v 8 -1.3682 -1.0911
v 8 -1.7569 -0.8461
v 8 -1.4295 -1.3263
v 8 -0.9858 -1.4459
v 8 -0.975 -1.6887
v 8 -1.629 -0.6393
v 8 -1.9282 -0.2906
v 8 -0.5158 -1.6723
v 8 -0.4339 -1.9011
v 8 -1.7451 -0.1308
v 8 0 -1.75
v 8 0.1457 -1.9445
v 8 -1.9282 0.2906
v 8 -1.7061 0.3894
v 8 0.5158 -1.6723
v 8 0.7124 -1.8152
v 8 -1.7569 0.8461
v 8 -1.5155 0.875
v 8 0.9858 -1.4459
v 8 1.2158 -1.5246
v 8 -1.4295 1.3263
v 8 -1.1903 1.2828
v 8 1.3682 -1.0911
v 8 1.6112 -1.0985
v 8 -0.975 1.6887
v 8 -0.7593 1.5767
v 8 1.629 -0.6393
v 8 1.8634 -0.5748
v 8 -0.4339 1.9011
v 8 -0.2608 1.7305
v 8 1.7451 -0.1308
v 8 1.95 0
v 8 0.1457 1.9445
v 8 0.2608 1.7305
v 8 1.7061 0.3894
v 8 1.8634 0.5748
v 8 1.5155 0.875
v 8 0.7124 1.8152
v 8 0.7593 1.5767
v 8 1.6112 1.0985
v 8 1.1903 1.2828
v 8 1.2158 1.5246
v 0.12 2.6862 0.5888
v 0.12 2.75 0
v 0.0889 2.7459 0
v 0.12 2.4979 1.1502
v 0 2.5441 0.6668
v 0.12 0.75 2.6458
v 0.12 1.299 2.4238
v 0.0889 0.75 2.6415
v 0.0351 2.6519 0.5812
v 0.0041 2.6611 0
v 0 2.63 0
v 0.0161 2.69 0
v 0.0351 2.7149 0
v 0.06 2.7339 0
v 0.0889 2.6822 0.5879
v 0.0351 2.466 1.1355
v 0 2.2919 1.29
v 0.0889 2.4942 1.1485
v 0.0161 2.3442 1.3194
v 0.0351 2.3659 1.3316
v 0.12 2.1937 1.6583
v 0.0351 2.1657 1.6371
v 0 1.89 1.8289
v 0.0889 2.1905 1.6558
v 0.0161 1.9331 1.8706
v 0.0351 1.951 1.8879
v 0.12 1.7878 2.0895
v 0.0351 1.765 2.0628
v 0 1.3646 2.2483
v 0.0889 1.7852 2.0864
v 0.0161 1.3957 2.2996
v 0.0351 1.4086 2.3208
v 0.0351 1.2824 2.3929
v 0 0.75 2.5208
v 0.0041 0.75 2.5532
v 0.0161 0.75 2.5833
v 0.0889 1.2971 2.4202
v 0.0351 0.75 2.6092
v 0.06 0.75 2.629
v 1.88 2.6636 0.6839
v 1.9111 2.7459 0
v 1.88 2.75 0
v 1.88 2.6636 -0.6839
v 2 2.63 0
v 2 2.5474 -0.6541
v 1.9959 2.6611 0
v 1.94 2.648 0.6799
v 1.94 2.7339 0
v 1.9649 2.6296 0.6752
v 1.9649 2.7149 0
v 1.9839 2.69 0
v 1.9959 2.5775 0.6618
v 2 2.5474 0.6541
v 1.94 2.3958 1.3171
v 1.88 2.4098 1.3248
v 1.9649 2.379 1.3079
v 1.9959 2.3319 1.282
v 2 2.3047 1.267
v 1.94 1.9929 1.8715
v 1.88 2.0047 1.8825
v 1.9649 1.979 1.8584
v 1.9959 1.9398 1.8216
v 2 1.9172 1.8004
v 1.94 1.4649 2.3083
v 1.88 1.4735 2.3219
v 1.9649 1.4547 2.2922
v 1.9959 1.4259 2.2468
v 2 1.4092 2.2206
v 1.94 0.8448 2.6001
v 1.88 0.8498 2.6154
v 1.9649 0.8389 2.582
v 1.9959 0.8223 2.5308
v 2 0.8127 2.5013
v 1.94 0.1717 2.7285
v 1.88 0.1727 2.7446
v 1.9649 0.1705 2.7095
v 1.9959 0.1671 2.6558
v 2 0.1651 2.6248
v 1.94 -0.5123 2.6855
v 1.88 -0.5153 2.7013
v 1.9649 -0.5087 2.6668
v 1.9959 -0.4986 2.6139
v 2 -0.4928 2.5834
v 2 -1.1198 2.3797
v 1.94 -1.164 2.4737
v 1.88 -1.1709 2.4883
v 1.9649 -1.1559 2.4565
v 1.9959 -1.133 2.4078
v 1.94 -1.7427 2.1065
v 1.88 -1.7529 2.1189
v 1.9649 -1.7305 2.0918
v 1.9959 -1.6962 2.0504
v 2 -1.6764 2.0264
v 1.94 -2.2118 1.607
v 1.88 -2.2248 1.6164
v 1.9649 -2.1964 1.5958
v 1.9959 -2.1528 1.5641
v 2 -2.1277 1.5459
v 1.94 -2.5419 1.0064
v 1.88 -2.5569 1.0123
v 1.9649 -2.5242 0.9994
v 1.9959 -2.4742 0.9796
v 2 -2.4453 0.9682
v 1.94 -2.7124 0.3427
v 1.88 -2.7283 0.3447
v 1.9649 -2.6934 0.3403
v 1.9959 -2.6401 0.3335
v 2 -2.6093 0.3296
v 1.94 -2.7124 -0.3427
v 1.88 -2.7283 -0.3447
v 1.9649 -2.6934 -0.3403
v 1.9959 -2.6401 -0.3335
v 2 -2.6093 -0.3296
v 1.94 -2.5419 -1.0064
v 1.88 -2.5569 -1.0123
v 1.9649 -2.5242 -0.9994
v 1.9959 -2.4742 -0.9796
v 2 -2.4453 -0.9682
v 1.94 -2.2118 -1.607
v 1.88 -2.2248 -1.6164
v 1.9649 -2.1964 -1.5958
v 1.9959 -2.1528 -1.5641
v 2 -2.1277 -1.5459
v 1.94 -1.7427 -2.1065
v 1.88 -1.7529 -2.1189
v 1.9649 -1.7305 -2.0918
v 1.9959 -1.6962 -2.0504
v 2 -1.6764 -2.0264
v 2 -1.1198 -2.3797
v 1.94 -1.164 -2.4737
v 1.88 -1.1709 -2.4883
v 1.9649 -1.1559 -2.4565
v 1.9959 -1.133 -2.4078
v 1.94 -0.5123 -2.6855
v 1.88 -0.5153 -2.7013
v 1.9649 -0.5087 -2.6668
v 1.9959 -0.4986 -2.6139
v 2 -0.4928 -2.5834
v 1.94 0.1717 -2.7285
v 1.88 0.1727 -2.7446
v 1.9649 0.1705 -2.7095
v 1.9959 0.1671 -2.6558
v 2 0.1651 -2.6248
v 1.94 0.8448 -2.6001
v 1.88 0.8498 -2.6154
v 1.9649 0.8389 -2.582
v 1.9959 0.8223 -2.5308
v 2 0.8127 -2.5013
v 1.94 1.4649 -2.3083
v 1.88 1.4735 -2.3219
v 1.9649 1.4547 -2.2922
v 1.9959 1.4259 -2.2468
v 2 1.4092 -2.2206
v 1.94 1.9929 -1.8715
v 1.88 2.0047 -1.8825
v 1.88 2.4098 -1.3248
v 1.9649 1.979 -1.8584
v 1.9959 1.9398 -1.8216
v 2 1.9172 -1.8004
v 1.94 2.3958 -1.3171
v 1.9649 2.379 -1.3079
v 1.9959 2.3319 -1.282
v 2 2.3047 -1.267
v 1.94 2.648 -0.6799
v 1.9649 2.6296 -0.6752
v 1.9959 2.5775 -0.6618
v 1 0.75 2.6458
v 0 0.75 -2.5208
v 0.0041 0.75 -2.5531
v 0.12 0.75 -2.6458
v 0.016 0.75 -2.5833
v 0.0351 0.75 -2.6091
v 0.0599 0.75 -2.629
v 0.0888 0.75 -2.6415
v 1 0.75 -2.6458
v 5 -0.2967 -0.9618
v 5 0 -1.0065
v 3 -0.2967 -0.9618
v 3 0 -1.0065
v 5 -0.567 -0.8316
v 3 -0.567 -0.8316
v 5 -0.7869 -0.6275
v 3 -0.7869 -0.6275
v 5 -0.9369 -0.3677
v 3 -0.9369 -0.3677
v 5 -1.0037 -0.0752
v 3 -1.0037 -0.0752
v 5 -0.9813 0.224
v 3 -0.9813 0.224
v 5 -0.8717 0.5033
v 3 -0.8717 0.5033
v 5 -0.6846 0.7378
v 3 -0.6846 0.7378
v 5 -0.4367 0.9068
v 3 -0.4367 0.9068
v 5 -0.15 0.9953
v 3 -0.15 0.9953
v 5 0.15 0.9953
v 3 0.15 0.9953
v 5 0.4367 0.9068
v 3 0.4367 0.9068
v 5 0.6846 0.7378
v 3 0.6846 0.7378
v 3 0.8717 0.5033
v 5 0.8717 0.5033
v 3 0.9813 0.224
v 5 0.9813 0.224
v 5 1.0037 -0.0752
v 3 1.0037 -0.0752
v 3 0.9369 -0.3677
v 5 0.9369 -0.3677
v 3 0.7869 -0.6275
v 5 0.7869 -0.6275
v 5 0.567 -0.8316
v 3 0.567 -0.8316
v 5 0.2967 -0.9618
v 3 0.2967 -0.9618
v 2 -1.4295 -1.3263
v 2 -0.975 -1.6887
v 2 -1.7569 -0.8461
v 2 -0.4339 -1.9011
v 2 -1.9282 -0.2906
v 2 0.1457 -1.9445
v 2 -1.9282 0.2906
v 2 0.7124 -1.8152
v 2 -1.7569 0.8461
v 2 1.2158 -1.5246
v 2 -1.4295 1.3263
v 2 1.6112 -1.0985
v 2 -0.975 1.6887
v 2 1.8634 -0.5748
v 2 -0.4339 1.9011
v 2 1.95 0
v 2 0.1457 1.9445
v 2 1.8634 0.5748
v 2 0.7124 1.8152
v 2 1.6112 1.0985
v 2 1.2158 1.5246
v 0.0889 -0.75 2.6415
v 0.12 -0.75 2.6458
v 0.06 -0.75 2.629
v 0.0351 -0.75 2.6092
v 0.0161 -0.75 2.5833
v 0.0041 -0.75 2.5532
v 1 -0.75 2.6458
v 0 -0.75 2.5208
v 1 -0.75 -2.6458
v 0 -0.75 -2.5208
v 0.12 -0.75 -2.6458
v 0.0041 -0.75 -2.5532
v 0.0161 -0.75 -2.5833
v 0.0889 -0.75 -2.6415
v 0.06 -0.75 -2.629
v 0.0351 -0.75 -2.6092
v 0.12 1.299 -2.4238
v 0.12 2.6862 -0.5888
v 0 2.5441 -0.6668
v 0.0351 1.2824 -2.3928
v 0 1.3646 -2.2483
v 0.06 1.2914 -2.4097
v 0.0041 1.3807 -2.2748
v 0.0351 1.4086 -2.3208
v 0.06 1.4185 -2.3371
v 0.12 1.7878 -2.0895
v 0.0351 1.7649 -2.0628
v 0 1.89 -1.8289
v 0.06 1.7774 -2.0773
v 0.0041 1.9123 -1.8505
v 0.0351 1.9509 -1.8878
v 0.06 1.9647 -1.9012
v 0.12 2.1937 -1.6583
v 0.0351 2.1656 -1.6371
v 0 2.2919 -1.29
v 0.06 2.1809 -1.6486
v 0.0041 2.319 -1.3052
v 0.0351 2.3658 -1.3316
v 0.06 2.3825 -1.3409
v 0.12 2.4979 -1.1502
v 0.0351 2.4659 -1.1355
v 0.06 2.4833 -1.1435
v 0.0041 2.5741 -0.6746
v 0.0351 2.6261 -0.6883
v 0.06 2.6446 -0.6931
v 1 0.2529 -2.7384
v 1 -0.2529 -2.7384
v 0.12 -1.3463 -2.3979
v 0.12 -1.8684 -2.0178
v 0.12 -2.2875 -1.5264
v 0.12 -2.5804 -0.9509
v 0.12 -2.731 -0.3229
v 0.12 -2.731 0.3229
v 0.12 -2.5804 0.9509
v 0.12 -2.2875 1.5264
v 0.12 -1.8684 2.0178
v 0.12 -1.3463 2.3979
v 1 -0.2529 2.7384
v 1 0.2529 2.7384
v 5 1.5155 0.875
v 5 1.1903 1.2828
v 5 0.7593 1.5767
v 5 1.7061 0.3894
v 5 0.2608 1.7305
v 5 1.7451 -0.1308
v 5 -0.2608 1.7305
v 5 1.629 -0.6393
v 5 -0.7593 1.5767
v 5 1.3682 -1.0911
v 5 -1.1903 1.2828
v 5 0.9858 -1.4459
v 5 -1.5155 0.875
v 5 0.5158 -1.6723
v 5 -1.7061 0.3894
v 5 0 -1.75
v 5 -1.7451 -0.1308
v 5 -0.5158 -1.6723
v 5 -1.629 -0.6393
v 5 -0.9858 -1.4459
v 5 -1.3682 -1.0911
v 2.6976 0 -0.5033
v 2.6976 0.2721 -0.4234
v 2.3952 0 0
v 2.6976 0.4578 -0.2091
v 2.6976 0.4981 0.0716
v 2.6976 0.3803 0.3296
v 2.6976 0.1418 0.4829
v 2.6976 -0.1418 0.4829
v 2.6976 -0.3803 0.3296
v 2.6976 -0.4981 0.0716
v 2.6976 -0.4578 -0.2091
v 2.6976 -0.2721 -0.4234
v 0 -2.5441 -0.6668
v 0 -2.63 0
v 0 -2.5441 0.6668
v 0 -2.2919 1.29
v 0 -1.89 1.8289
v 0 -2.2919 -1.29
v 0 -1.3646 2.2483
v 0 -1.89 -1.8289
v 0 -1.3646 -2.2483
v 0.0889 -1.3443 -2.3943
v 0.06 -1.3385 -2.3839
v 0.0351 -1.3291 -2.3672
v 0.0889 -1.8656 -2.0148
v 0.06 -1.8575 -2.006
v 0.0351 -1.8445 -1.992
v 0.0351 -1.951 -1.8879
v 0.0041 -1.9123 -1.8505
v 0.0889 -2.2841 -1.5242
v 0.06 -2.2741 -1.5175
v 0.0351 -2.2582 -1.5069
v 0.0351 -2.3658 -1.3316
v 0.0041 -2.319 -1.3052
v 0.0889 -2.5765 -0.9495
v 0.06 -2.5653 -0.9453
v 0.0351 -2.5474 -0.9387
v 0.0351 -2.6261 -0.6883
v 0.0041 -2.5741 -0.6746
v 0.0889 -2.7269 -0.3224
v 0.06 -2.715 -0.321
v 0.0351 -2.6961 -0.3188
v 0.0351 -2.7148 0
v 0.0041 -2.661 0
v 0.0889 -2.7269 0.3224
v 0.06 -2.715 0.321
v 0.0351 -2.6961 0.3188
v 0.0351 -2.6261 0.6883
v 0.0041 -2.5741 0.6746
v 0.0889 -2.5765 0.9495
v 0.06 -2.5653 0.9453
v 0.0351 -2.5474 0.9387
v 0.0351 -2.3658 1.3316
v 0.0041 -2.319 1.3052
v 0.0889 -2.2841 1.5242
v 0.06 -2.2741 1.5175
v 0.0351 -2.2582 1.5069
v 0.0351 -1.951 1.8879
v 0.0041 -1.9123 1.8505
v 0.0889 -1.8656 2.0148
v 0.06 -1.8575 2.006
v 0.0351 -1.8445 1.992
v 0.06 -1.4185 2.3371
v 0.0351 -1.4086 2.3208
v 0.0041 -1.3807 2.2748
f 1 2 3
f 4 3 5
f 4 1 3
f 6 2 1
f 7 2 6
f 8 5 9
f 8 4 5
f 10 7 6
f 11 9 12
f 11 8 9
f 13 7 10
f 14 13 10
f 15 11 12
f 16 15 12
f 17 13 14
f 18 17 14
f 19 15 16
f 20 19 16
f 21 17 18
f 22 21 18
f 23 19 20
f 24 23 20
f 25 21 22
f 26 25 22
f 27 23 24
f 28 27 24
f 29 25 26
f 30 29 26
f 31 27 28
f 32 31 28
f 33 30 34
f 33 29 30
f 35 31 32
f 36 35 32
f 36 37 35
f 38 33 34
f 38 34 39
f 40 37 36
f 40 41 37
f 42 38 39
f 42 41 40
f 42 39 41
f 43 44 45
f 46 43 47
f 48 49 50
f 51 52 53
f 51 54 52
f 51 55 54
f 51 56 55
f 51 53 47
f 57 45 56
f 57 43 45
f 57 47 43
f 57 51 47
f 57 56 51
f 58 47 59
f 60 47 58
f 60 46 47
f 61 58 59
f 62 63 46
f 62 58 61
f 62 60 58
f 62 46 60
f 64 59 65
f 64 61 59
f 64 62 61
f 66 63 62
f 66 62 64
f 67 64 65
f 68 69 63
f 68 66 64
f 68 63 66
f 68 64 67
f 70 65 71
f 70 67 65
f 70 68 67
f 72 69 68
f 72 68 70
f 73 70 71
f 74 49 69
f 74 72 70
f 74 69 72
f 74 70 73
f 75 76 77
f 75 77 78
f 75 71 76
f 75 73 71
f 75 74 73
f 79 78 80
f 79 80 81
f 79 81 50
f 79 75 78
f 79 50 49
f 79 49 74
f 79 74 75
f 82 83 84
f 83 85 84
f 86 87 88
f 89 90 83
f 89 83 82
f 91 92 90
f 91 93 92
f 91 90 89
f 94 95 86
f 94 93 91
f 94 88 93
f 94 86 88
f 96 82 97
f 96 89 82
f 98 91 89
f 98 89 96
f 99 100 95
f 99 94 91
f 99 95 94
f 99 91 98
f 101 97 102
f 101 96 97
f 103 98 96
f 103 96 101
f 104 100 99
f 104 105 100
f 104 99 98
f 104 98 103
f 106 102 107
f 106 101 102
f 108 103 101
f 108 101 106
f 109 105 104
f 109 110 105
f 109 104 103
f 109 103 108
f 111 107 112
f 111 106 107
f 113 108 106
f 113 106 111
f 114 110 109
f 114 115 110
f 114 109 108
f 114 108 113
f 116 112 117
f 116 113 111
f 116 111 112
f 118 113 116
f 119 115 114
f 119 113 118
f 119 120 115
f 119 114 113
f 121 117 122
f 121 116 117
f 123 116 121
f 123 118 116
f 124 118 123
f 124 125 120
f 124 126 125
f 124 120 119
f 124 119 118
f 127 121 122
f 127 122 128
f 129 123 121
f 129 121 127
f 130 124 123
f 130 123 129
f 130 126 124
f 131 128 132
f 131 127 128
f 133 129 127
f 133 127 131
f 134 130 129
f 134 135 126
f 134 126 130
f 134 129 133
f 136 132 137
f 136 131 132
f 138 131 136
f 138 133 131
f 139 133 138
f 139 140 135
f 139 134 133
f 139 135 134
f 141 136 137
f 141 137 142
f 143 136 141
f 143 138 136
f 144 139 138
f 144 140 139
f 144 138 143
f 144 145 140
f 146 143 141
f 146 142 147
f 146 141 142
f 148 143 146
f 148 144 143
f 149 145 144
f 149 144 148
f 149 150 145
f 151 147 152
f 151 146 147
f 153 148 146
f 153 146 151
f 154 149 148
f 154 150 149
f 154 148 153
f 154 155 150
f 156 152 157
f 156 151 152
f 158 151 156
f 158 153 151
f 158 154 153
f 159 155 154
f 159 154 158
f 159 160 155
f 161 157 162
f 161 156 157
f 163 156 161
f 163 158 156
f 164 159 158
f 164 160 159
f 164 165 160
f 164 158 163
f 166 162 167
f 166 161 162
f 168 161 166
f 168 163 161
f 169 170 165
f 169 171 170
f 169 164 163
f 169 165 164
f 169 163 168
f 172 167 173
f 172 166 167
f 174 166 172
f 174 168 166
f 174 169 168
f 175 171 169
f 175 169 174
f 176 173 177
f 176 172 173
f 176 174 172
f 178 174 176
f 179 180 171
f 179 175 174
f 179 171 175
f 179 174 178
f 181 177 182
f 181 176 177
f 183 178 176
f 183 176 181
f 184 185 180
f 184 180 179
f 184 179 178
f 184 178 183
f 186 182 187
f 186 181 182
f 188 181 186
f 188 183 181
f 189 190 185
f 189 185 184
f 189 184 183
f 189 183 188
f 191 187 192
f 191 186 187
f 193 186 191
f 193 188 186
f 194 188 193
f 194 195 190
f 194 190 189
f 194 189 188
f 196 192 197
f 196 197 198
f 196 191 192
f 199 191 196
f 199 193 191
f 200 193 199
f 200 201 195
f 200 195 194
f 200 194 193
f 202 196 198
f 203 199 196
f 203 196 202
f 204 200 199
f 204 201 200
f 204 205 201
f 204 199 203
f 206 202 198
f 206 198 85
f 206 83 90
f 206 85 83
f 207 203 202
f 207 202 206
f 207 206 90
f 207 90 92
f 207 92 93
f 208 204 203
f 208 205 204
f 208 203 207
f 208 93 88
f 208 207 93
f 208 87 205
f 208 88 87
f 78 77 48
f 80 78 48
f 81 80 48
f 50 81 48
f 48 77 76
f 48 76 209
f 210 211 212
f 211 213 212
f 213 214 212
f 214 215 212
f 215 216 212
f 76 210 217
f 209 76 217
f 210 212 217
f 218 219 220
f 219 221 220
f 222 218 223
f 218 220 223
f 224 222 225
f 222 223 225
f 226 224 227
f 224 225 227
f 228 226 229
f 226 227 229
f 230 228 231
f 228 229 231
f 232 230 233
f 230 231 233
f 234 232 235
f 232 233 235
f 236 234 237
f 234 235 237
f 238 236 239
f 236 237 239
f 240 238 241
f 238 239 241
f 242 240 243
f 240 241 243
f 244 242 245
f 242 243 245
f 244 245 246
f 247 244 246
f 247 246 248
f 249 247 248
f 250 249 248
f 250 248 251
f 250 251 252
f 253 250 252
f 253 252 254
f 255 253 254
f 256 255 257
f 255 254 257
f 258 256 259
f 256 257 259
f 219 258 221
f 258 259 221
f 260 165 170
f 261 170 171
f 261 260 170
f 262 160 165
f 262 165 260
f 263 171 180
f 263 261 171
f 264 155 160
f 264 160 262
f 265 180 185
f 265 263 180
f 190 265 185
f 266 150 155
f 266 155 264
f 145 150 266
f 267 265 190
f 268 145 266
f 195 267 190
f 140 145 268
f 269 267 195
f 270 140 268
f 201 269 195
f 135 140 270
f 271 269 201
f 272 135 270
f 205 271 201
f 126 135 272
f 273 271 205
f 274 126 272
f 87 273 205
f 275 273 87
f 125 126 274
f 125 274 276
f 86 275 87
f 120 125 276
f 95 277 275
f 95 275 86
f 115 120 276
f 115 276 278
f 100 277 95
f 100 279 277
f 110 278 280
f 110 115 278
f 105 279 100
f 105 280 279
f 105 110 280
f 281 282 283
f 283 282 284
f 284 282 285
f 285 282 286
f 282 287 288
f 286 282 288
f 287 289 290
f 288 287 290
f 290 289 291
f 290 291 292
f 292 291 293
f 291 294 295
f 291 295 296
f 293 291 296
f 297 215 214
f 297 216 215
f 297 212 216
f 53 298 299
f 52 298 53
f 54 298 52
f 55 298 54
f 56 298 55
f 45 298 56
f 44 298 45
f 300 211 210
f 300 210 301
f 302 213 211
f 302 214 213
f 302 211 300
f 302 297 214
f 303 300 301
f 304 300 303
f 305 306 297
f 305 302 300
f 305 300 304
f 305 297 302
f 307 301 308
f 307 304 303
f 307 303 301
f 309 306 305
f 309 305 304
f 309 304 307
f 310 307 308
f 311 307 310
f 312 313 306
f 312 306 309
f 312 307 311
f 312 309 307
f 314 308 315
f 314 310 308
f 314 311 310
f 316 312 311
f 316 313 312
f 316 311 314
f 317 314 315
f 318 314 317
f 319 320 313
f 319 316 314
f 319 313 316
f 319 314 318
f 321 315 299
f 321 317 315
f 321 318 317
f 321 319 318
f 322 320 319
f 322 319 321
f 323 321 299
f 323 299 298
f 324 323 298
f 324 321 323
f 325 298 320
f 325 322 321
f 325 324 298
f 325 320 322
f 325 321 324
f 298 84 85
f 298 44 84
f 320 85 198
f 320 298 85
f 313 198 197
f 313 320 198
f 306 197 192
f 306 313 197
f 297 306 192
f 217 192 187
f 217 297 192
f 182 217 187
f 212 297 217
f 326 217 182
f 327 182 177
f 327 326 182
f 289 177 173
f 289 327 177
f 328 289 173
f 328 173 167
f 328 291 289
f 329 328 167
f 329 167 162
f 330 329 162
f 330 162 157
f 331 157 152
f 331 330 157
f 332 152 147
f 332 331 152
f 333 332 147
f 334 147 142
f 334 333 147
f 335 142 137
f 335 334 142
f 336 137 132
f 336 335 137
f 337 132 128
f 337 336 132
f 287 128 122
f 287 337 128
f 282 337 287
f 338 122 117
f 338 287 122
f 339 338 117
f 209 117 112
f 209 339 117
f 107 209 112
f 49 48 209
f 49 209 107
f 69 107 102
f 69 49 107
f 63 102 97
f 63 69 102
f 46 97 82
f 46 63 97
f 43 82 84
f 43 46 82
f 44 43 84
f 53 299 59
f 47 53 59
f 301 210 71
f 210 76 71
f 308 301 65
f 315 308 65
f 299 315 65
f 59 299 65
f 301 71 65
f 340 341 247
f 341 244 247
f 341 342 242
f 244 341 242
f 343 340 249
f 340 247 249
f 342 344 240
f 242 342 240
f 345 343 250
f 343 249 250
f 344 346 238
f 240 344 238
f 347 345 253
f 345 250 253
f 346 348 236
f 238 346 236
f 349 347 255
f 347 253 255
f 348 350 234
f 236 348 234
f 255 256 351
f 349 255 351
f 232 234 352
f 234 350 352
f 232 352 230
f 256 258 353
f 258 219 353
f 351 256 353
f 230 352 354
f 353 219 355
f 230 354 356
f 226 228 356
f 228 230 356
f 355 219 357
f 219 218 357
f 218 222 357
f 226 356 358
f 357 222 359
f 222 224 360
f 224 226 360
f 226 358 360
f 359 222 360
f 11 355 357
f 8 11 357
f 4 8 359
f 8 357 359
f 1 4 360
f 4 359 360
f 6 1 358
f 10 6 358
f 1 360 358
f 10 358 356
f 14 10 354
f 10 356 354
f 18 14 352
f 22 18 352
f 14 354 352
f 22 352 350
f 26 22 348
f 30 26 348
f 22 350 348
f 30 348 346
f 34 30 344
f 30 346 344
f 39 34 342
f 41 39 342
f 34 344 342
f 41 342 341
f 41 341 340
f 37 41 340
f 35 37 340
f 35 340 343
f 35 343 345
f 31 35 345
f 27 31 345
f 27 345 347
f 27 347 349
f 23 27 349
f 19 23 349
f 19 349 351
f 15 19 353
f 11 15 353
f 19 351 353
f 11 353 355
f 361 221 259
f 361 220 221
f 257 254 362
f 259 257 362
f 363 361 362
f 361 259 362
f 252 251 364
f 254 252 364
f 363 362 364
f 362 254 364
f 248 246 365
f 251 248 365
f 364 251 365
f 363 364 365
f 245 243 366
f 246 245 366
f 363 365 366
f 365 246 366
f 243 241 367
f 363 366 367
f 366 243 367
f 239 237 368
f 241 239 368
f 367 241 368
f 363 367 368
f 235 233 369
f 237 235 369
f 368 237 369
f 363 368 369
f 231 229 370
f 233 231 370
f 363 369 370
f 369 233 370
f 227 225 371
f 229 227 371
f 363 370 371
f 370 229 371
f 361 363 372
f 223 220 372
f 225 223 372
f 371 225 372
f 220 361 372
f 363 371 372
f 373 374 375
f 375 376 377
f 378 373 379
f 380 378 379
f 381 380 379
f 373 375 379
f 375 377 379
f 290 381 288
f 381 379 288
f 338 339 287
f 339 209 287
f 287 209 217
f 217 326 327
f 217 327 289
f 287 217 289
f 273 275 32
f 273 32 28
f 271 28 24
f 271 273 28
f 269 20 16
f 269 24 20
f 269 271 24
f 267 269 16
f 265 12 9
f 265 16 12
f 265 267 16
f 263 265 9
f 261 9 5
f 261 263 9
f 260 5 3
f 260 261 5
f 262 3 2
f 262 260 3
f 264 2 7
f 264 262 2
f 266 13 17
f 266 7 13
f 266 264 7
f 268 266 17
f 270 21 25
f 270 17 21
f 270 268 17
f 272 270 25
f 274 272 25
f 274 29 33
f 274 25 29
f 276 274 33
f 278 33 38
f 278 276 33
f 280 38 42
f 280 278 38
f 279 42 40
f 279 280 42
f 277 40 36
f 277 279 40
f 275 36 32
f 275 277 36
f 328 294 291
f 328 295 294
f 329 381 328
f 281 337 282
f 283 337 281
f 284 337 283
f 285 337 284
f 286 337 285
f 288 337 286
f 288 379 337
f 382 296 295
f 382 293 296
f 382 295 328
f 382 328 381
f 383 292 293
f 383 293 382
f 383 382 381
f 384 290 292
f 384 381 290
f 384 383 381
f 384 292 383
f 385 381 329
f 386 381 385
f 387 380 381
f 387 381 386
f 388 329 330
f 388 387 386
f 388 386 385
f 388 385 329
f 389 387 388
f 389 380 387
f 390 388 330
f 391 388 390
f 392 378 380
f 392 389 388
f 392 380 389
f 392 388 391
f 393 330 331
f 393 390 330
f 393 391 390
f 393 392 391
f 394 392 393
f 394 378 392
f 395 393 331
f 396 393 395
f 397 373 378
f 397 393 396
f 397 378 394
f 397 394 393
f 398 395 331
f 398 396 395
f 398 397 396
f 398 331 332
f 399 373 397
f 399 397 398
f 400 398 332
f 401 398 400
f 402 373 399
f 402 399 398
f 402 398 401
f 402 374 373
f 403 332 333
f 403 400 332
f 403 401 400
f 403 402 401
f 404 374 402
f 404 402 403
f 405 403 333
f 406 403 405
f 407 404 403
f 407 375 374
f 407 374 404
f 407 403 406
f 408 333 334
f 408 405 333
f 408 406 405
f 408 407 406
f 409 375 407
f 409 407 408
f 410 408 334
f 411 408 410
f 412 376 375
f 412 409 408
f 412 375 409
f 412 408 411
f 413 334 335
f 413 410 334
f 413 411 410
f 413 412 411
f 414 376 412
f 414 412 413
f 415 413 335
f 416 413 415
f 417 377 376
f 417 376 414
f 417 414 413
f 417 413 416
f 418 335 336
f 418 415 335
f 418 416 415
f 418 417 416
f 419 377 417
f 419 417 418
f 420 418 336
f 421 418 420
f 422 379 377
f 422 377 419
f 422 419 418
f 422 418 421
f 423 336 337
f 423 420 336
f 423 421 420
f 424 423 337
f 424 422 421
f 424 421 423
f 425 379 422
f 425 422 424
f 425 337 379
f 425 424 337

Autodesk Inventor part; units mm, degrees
ref_plane "YZ Plane" through (0, 0, 0) normal (1, 0, 0) x (0, 1, 0)
sketch "Sketch1" plane through (0, 0, 0) normal (0, 0, 1) x (1, 0, 0)
  line L0 (0, 0) -> (2, 0)
  line L1 (2, 0) -> (2, 2.75)
  line L2 (2, 2.75) -> (0, 2.75)
  line L3 (0, 2.75) -> (0, 0)
  line L4 (2, 0) -> (8, 0)
  line L5 (8, 0) -> (8, 1.95)
  line L6 (8, 1.95) -> (2, 1.95)
  line L7 (2, 1.95) -> (2, 0)
  dimension "d0" = 8
  dimension "d1" = 2
  dimension "d2" = 5.5
  dimension "d3" = 3.9
revolve "Revolution1" add sketch "Sketch1" angle 360 about axis through (0, 0, 0) along (1, 0, 0)
ref_plane "Work Plane1" through (1, 0, 0) normal (-1, 0, 0) x (0, 0, 1)
ref_plane "Work Plane2" through (1, 0, 0) normal (1, 0, 0) x (0, 0, -1)
sketch "Sketch2" plane through (0, 0, 0) normal (0, 0, 1) x (1, 0, 0)
  line L0 (0, 0.75) -> (1, 0.75)
  line L1 (1, 0.75) -> (1, -0.75)
  line L2 (1, -0.75) -> (0, -0.75)
  line L3 (0, -0.75) -> (0, 0.75)
  point P0 (0, 0)
  point P1 (0, 0)
  dimension "d7" = 1
  dimension "d8" = 1.5
extrude "Extrusion1" cut sketch "Sketch2" along normal through all both and the other way through all
hole "Hole1" at (8, 0, 0) direction (-1, 0, 0) diameter 2.013 depth 5 tip angle 118 counterbore diameter 3.5 counterbore depth 3 thread size "M2.5x0.45" class "6H" standard "ANSI Metric M Profile"
fillet "Fillet1" radius 0.12 4 edges at (0, 2.1937, -1.6583) (0, 2.1937, 1.6583) (0, -2.75, 0) (2, -2.75, 0)
properties part number "308-02" material "Steel"
